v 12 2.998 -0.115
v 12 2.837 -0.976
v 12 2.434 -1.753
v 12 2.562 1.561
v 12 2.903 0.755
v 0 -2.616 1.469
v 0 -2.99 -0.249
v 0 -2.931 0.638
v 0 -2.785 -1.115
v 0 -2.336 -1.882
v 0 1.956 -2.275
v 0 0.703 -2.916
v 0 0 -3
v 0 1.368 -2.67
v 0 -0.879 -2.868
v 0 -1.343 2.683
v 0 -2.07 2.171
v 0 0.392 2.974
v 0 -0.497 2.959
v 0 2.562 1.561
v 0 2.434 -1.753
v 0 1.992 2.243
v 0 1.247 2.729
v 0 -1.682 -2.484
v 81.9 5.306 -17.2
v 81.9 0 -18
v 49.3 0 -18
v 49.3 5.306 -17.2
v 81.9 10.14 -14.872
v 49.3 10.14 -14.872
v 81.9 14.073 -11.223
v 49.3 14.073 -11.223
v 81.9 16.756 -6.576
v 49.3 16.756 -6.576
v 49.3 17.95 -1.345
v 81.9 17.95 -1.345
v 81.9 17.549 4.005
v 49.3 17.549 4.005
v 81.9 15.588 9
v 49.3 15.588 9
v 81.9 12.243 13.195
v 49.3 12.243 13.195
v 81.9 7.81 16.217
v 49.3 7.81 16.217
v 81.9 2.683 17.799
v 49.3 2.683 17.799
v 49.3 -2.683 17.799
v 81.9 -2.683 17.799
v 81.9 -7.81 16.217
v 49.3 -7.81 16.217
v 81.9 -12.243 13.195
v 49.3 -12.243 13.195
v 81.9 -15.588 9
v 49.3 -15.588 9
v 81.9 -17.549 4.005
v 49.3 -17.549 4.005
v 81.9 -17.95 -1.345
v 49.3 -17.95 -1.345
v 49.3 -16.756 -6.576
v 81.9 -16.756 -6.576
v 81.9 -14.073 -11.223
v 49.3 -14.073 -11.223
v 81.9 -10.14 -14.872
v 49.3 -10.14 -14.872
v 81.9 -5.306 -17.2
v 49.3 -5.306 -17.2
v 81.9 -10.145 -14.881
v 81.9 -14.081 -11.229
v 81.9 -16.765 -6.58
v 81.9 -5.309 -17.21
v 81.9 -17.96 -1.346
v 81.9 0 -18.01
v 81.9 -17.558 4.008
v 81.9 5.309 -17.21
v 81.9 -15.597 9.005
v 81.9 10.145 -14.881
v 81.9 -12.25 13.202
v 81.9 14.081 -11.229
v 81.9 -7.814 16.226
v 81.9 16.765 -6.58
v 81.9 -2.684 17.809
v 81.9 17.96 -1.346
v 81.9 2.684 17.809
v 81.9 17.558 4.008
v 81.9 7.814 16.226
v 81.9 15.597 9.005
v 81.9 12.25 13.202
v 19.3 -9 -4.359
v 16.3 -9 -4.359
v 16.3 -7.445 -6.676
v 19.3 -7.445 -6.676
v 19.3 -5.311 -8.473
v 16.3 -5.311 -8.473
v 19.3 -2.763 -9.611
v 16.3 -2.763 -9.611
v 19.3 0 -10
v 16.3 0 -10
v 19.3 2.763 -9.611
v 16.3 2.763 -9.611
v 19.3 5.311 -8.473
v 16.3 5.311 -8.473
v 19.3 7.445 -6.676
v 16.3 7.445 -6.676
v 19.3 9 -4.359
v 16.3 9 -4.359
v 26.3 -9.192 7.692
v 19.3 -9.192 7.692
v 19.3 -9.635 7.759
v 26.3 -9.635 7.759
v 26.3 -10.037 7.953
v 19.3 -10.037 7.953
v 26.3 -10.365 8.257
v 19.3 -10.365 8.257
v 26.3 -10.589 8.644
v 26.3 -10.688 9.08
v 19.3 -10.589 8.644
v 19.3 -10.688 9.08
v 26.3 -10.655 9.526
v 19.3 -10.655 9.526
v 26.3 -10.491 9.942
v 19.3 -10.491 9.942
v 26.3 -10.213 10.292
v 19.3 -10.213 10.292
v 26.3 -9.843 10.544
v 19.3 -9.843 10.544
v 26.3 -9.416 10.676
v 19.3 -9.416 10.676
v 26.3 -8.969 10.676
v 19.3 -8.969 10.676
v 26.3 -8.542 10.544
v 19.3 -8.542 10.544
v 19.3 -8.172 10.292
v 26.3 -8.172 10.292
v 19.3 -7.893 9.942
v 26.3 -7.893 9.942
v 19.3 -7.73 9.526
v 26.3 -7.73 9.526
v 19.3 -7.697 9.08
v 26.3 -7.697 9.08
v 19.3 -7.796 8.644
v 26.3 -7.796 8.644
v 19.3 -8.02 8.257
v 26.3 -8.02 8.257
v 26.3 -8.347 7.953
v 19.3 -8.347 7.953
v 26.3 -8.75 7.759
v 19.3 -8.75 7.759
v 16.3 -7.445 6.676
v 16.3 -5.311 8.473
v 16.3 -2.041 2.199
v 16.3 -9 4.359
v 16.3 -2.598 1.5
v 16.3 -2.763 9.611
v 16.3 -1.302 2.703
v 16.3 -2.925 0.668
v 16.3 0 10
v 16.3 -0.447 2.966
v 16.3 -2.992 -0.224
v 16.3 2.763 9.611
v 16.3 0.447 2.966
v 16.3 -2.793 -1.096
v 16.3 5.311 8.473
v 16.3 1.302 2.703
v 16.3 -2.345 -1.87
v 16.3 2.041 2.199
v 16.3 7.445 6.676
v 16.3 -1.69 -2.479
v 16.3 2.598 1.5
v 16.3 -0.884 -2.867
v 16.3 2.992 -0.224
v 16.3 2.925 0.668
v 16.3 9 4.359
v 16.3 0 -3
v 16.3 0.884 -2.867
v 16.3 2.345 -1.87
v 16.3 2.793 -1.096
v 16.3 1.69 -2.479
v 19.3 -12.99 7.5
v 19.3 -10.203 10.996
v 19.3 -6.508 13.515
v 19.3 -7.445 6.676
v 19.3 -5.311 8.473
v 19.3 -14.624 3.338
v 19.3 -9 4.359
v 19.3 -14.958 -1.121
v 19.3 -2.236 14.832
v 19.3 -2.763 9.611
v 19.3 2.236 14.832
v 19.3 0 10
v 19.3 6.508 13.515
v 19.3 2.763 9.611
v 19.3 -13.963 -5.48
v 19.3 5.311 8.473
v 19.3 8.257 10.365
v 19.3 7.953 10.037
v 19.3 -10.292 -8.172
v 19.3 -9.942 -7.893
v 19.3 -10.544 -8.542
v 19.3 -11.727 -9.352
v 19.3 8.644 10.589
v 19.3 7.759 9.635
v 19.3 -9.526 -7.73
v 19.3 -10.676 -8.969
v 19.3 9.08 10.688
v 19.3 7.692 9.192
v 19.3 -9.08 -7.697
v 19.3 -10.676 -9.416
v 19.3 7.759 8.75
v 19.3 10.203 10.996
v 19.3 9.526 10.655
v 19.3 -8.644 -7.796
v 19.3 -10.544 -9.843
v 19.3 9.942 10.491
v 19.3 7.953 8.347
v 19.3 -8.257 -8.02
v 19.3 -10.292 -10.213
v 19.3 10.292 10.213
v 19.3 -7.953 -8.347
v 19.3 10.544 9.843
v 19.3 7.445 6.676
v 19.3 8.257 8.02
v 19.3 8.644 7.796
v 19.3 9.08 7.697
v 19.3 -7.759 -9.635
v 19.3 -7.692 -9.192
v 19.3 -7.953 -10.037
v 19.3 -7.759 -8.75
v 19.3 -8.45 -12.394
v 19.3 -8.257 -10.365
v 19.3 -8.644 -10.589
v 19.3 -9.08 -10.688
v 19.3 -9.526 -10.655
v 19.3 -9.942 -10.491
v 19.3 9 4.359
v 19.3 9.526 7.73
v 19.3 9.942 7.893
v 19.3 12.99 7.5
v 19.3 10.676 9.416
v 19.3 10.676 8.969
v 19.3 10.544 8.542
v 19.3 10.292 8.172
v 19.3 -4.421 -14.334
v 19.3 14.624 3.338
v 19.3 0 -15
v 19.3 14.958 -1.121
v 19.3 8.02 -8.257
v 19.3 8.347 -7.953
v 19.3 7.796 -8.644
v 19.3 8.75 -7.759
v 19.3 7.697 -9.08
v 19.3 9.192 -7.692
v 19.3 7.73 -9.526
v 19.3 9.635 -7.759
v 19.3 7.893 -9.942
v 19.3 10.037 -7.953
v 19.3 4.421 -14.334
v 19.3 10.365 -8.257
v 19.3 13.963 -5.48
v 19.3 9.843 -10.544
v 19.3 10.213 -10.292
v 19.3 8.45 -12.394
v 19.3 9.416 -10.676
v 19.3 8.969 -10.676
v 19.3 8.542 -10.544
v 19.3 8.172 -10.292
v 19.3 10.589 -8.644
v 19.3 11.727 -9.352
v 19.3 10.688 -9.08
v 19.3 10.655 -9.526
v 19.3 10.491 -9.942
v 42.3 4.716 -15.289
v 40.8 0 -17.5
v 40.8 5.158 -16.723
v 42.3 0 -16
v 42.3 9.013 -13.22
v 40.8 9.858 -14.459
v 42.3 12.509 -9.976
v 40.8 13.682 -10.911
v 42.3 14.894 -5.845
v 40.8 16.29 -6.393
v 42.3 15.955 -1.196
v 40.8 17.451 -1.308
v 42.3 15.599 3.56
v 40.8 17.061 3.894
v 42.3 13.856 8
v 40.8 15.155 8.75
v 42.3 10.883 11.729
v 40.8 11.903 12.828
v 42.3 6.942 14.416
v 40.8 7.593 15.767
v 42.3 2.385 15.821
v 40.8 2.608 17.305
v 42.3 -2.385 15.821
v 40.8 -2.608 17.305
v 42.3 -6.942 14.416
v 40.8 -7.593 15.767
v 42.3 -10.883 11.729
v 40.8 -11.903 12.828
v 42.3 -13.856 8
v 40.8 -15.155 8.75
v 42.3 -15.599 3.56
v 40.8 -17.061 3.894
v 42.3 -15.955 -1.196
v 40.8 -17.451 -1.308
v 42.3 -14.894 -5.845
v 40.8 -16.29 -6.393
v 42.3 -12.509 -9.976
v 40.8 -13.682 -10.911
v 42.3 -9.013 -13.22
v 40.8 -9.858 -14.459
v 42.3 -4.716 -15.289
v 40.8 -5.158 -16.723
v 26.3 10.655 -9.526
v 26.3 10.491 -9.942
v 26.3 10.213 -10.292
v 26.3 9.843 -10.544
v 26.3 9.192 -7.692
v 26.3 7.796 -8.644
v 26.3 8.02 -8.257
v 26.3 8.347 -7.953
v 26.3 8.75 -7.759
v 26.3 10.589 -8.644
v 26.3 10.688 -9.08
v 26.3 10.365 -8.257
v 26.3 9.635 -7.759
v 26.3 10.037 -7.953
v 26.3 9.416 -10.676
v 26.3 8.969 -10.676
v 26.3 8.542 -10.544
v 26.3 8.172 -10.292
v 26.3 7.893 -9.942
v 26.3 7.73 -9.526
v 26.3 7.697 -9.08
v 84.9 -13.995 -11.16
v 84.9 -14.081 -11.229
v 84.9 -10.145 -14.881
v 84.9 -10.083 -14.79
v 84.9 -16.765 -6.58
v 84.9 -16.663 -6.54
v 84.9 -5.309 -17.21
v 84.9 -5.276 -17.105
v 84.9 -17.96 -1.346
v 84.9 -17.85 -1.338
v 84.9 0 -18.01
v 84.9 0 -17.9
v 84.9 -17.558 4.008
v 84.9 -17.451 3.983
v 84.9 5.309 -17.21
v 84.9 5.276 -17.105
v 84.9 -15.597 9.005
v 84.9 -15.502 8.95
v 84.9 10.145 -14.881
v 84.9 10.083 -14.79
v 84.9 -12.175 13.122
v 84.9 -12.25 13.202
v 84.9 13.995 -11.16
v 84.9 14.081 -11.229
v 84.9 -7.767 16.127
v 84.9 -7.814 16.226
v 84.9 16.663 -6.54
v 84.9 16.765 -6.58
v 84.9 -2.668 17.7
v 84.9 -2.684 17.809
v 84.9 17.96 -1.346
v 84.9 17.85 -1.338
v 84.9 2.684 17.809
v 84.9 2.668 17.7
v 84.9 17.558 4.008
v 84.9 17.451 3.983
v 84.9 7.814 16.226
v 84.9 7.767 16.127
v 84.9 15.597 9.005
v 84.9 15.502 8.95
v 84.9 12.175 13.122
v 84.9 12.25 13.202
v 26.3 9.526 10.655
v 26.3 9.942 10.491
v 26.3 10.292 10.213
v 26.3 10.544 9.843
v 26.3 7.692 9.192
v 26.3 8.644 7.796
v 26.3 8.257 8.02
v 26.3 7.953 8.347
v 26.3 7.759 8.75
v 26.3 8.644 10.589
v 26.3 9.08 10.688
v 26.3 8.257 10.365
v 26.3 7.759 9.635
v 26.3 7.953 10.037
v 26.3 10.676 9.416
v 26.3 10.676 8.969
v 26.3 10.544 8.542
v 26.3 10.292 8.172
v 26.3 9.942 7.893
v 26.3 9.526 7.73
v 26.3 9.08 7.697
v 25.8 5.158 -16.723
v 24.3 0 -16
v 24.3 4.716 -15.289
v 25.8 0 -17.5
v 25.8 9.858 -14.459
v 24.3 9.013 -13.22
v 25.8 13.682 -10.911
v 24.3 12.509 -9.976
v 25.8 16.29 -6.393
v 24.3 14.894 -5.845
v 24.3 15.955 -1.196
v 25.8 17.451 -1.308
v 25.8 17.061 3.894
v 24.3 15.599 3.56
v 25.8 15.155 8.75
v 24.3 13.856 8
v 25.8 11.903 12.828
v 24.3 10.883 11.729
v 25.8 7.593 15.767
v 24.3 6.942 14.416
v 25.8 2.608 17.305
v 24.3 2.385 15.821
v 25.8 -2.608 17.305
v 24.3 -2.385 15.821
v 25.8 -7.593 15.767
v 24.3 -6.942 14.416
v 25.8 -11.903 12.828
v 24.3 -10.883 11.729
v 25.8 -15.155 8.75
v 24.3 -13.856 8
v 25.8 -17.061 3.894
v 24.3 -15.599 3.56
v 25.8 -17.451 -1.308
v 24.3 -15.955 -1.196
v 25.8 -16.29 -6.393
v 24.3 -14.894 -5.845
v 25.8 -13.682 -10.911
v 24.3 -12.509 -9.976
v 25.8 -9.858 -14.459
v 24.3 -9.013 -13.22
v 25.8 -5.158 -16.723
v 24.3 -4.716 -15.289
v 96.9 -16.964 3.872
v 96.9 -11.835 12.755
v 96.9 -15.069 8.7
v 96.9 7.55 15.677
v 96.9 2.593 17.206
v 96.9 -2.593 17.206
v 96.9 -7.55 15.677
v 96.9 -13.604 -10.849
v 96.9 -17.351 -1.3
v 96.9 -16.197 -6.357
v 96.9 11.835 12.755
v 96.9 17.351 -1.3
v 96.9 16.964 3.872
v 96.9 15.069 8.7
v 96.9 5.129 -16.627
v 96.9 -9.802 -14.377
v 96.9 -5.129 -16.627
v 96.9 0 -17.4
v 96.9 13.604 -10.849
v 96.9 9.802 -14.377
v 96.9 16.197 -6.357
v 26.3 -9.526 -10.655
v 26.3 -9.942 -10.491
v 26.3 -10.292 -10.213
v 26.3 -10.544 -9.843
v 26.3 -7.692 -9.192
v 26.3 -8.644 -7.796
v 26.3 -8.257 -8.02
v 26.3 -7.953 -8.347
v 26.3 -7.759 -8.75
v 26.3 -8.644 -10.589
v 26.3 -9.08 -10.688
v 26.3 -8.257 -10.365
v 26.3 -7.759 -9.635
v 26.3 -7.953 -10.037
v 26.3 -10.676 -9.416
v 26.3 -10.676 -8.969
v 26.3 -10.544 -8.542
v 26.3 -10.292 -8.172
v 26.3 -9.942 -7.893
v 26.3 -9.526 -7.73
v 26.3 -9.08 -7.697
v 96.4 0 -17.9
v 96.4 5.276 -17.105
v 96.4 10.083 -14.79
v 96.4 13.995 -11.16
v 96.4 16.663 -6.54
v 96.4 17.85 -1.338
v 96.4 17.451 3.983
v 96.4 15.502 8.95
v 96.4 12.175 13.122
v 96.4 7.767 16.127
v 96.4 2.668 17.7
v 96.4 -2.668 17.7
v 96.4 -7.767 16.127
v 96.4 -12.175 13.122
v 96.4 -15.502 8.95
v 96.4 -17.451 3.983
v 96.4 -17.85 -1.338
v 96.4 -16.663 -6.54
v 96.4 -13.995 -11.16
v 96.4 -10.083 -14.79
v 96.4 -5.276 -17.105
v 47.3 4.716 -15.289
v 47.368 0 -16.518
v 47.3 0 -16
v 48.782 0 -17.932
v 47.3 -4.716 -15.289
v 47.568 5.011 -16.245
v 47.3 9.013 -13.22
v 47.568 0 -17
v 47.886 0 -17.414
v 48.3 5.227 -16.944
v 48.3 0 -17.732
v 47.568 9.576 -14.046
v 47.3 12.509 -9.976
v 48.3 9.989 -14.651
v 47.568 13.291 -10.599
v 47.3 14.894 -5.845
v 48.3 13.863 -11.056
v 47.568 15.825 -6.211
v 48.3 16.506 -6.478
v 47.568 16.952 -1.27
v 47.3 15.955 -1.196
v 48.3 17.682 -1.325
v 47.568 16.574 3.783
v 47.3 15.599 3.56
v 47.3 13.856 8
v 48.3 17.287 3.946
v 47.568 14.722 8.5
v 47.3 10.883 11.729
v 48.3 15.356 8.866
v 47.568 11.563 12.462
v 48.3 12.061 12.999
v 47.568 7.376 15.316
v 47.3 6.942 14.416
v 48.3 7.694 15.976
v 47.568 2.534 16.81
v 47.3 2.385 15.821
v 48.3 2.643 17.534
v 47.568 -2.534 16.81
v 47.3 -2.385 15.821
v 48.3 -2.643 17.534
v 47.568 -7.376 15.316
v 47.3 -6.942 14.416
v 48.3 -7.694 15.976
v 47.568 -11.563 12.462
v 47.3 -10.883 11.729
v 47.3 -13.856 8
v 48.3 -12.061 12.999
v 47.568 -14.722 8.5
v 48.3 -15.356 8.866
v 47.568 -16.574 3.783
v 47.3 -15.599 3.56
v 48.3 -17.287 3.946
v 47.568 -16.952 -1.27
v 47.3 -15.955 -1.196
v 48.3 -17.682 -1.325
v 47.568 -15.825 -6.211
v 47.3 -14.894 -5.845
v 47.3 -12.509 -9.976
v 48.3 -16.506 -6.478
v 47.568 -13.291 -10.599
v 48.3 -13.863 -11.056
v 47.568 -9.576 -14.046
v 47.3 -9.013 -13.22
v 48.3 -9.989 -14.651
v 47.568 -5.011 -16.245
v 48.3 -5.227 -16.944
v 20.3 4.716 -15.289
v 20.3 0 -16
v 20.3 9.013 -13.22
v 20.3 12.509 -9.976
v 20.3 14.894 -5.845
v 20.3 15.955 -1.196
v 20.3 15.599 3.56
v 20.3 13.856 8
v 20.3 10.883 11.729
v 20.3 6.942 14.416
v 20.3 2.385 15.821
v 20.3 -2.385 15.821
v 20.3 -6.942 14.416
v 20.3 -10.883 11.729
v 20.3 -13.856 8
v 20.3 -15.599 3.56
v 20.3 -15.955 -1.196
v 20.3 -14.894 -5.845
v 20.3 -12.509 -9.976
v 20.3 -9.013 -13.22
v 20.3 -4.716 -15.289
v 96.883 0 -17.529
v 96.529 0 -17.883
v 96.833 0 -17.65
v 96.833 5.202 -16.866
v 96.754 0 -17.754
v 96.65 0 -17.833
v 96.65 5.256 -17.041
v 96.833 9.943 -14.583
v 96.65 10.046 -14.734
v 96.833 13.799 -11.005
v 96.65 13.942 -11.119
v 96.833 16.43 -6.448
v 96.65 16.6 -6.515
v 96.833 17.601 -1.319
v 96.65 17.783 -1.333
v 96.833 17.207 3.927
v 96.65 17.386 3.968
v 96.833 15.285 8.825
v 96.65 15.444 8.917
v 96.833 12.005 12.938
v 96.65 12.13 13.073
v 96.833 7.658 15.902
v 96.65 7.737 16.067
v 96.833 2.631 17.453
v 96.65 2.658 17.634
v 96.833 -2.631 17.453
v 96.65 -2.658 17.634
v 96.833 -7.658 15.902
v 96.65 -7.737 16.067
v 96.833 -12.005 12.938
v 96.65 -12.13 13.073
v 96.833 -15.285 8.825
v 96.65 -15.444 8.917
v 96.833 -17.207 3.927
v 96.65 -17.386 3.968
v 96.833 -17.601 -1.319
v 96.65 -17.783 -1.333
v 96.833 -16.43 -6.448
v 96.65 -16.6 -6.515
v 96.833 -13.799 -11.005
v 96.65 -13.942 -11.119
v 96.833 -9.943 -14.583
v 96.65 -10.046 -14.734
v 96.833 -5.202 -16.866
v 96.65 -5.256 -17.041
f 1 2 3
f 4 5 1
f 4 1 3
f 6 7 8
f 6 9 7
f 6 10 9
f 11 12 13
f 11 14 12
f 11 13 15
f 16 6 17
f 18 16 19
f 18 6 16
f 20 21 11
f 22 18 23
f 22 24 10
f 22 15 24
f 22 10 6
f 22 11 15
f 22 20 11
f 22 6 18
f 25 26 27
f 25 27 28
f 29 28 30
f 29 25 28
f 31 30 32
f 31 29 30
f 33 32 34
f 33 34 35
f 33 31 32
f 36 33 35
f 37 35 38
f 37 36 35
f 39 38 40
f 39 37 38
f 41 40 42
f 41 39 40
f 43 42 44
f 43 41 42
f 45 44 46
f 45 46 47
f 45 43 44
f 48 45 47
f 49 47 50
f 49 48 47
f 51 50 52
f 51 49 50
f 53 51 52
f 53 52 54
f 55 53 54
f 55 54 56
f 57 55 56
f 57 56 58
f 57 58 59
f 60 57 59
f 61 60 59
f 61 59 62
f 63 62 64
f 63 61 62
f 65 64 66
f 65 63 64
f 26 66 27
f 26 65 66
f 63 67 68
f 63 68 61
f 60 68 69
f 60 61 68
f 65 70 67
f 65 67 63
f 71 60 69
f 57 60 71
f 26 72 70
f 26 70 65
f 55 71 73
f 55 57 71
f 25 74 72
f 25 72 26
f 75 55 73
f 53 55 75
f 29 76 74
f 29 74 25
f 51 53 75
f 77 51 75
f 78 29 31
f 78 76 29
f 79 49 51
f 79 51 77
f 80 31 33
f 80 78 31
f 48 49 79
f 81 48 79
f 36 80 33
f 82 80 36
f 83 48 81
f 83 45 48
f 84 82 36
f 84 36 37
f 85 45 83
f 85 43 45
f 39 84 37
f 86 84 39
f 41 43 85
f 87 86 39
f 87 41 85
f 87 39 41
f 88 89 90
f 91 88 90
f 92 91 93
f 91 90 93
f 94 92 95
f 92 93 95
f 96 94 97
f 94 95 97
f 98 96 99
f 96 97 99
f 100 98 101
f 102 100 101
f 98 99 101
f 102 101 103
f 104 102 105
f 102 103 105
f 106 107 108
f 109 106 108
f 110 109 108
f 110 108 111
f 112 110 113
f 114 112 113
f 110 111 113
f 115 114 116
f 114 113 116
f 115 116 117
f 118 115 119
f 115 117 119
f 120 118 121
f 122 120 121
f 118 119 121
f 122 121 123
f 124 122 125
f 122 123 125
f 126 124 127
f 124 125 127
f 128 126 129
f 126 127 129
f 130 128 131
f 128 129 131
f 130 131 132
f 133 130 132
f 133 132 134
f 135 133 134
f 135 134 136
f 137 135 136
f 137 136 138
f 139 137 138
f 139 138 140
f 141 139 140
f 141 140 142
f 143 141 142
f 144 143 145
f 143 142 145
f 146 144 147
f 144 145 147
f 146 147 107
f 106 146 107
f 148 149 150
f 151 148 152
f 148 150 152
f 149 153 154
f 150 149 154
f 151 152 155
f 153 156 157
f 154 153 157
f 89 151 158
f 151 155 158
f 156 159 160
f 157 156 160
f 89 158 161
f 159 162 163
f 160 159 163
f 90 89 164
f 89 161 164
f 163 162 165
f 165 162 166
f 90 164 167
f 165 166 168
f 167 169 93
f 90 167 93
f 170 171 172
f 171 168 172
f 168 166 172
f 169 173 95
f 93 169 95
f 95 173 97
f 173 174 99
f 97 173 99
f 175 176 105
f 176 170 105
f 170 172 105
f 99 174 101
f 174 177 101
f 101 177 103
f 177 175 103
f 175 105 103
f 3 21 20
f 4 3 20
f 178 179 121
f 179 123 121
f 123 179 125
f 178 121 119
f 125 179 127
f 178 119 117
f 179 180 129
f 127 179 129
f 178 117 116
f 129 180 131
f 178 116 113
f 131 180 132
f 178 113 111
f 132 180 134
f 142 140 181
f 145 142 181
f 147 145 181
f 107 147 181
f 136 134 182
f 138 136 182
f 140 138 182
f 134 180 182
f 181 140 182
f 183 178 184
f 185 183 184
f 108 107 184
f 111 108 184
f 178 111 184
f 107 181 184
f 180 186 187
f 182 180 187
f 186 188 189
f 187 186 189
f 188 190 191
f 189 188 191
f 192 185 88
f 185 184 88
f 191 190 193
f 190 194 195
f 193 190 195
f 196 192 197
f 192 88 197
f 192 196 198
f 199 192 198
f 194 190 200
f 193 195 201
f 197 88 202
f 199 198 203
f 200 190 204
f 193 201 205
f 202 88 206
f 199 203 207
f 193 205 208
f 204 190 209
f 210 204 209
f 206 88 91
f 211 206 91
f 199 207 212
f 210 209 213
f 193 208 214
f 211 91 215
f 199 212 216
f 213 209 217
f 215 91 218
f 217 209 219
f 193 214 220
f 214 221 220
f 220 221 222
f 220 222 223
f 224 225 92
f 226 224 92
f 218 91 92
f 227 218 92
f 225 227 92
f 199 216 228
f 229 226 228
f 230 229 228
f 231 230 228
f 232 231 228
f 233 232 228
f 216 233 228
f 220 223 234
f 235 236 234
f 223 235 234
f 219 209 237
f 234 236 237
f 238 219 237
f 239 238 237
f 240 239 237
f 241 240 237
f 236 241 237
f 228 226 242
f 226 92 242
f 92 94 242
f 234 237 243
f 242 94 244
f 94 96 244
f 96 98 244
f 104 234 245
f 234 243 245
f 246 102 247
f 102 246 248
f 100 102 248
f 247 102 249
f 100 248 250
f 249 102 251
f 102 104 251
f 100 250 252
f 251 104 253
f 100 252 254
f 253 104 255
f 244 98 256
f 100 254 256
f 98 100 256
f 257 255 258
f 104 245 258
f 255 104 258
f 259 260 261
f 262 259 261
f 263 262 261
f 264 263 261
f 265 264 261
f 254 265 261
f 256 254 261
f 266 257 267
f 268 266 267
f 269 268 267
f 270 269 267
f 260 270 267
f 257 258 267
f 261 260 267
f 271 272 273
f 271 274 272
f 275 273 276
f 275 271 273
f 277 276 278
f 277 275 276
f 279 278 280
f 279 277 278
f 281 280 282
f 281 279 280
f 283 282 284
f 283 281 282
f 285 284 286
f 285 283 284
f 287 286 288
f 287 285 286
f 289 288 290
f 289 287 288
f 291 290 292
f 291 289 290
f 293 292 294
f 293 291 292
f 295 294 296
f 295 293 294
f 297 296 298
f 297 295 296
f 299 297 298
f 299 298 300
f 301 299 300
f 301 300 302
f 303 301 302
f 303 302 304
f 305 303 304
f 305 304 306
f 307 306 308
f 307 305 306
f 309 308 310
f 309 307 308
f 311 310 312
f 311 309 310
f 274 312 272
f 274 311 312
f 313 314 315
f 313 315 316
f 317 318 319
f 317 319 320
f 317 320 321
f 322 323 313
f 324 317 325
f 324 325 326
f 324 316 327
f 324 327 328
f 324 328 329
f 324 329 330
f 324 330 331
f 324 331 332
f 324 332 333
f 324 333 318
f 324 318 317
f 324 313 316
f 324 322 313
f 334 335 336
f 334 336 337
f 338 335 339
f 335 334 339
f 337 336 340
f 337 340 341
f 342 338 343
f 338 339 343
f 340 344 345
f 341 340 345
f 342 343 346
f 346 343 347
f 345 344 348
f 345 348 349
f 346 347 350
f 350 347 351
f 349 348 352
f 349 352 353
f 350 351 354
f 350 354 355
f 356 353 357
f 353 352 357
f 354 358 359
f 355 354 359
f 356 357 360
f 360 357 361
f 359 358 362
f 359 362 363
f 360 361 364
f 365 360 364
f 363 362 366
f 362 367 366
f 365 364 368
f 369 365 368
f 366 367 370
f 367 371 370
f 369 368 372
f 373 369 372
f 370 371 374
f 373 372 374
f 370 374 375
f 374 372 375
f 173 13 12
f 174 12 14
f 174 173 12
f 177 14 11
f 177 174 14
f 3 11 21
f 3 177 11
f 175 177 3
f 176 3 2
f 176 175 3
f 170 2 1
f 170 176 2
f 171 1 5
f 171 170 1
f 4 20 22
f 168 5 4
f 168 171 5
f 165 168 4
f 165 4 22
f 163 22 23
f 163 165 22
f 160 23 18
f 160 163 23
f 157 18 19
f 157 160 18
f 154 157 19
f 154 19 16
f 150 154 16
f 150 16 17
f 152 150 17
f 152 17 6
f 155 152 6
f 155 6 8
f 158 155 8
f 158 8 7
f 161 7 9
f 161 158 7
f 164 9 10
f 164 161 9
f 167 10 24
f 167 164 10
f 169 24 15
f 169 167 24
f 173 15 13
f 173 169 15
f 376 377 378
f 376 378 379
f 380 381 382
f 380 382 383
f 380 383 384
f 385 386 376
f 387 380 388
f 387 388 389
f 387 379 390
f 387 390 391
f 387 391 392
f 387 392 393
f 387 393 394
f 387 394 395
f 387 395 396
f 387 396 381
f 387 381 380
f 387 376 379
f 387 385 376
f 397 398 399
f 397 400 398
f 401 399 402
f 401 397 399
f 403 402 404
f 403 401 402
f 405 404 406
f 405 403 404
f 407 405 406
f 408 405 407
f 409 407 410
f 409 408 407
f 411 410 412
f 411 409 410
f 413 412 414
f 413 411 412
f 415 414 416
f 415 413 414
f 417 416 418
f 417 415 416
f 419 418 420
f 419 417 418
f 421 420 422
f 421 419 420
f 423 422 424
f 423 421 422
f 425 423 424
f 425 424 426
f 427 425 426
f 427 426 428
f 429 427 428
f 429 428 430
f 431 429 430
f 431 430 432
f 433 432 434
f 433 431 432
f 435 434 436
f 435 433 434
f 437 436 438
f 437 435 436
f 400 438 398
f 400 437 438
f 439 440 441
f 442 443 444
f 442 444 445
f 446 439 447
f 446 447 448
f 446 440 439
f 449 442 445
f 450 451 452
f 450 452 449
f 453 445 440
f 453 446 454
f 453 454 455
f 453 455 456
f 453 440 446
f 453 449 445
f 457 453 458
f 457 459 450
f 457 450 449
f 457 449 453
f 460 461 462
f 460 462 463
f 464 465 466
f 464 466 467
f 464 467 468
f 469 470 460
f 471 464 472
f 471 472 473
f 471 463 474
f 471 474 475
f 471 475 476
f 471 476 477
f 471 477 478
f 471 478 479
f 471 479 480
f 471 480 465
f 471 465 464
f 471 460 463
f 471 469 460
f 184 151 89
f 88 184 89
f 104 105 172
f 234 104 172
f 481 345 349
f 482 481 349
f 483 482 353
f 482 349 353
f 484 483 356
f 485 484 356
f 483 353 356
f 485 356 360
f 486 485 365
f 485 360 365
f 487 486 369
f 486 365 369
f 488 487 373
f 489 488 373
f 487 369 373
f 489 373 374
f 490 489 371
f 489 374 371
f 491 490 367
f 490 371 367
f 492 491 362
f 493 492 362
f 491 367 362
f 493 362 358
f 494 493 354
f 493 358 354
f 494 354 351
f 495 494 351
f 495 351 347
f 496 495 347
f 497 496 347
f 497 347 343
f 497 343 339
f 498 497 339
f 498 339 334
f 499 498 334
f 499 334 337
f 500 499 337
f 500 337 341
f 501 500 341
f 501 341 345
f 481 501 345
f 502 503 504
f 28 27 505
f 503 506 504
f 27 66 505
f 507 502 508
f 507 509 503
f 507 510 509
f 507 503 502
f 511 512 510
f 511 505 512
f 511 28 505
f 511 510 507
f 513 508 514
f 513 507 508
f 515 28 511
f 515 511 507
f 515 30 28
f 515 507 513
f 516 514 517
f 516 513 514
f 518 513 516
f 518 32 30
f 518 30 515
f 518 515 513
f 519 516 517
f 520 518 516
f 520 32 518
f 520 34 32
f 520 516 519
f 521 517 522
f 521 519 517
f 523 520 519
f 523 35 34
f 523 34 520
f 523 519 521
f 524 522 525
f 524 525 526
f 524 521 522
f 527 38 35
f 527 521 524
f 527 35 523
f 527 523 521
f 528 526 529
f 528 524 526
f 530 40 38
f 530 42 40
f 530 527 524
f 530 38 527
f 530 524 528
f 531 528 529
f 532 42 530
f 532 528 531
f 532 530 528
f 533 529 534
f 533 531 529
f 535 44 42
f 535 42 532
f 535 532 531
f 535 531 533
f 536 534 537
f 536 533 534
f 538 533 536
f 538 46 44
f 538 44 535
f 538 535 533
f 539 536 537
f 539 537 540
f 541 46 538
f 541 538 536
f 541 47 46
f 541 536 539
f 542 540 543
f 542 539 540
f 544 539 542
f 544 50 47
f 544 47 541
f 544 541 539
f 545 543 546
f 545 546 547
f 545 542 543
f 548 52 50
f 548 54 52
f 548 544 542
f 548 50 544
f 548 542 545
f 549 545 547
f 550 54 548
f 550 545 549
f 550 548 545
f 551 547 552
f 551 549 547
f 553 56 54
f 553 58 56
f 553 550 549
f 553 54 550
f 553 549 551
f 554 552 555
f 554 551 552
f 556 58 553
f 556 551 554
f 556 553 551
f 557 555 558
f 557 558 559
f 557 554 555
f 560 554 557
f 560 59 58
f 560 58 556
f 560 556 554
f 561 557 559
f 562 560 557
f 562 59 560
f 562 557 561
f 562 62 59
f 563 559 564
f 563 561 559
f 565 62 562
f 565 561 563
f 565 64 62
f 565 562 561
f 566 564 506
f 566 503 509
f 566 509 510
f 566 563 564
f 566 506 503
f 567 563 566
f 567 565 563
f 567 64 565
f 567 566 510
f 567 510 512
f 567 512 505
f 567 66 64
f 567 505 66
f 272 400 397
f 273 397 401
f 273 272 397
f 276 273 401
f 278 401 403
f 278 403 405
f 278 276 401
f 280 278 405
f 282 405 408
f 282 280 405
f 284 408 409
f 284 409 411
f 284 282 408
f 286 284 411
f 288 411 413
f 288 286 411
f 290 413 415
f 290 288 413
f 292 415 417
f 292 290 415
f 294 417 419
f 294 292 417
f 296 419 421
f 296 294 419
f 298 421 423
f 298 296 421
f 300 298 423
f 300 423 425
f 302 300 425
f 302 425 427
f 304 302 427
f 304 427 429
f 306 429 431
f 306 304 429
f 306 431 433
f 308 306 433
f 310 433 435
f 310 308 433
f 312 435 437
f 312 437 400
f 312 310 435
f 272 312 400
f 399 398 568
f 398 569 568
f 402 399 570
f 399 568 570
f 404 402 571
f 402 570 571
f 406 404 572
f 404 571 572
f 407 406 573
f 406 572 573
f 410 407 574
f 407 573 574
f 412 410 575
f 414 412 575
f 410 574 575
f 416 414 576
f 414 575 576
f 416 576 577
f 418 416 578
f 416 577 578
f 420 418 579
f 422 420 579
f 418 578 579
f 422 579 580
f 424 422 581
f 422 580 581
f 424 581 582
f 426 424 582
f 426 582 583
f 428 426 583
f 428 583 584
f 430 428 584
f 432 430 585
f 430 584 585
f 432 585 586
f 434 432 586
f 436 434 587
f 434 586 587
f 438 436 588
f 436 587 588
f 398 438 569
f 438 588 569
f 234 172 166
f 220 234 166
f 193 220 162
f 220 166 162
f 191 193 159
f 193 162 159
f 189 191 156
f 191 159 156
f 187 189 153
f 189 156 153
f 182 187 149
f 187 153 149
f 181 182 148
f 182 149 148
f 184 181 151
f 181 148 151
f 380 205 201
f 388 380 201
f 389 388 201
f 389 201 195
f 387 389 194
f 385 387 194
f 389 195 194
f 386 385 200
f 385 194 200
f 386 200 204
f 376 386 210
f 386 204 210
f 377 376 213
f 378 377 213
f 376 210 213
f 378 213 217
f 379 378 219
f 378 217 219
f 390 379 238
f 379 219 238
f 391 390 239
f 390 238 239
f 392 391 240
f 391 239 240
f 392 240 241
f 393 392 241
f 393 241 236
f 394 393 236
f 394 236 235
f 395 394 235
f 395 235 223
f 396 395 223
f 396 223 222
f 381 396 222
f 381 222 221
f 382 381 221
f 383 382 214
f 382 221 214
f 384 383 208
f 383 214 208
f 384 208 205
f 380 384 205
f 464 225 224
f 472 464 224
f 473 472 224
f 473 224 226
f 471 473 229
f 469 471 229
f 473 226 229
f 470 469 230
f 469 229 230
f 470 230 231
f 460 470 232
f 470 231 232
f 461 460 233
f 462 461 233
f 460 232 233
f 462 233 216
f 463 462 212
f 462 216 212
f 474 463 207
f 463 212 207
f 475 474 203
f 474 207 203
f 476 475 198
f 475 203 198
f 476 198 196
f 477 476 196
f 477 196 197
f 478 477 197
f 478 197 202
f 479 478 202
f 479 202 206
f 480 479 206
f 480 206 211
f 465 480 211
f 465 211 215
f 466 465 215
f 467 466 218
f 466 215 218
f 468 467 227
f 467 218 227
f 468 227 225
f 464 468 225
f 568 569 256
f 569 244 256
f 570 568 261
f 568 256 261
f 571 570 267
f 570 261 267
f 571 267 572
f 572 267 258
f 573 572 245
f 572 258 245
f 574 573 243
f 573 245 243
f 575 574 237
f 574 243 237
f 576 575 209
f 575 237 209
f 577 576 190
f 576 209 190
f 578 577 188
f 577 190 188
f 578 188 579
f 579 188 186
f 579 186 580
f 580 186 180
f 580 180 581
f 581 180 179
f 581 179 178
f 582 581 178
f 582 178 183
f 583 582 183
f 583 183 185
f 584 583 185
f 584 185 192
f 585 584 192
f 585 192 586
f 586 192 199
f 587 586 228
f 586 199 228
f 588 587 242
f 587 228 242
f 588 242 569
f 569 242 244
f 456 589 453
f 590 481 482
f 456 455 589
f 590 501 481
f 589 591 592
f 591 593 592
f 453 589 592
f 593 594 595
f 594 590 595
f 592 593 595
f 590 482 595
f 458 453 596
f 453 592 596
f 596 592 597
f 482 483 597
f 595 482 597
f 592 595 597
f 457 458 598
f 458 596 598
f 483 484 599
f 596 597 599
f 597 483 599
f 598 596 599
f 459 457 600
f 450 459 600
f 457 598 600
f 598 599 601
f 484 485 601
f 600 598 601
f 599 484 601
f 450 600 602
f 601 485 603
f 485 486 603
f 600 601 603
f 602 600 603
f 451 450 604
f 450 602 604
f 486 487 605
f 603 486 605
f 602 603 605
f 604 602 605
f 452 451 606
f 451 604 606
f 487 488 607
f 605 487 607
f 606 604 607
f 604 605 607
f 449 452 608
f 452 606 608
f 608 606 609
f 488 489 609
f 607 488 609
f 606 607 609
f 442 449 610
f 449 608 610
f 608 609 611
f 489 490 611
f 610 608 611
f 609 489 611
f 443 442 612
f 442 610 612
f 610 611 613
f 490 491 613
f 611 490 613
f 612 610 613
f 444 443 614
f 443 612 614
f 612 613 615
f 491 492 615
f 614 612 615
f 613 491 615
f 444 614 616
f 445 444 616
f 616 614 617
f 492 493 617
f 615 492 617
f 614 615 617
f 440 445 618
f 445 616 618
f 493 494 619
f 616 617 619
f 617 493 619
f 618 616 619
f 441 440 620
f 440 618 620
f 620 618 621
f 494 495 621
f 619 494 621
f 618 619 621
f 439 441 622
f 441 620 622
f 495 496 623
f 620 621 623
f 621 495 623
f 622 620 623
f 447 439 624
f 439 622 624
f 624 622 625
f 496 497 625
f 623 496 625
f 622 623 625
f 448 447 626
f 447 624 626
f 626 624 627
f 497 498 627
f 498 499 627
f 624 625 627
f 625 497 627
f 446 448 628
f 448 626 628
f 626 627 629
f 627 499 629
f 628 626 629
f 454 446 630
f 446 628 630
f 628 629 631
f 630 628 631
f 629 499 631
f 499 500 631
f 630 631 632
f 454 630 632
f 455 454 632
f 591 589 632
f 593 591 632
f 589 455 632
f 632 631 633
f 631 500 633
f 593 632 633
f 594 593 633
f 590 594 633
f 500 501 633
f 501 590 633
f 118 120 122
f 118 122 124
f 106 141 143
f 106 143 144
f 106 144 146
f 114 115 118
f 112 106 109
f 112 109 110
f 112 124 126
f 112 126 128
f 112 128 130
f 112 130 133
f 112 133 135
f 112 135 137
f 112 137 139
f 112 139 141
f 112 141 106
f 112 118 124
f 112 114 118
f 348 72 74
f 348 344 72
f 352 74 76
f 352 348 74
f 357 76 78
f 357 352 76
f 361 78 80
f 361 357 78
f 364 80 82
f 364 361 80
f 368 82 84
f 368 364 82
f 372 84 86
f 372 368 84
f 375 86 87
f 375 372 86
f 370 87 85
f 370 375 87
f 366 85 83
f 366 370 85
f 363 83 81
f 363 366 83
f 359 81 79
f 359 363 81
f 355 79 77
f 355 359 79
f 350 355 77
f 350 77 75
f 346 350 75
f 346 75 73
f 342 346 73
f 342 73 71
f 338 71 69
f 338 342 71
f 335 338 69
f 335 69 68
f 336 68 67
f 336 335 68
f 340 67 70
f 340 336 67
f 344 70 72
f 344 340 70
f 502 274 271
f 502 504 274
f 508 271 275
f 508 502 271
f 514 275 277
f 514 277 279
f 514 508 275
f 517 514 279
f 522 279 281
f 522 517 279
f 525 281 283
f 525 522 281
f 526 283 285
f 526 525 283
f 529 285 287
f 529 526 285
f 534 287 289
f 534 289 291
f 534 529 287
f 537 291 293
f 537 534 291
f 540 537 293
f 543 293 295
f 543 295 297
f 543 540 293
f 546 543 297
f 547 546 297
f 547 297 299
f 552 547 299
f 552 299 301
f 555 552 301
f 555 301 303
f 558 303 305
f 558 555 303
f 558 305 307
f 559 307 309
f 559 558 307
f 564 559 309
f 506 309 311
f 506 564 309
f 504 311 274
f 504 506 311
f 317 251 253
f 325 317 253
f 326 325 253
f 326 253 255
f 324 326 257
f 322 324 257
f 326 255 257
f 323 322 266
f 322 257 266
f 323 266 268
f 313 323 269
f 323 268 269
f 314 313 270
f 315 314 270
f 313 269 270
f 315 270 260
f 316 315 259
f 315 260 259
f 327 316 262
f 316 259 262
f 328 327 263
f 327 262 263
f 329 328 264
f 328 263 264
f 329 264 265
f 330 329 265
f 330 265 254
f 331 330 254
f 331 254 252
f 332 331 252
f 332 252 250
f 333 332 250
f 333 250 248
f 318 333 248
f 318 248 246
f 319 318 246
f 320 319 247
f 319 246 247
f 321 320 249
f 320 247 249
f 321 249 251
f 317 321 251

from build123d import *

# Parameters (mm, degrees)
SKETCH_1_W               = 16.3
SKETCH_1_H               = 3
SKETCH_1_W_2             = 5
SKETCH_1_H_2             = 16
SKETCH_4_R               = 18
EXTRUDE_1_DEPTH          = 14
SKETCH_5_R               = 18
CUT_EXTRUDE_2_DEPTH      = 3.5
CUT_EXTRUDE_4_DEPTH      = 12
SKETCH_8_W               = 12
SKETCH_8_H               = 0.1
FILLET_3_R               = 0.5
SKETCH_10_W              = 3
SKETCH_10_H              = 0.01
CUT_EXTRUDE_6_DEPTH      = 3
SKETCH_13_R              = 1.5
CUT_EXTRUDE_8_DEPTH      = 7
PATTERN_CIRCULAR_2_COUNT = 4


with BuildPart() as part:
    # Эскиз1 → Повернуть1 (revolve)
    with BuildSketch(Plane(origin=(0, 0, 0), x_dir=(1, 0, 0), z_dir=(0, 1, 0))):
        with Locations((8.15, 1.5)):
            Rectangle(SKETCH_1_W, SKETCH_1_H)
        Polygon((16.3, 0), (19.3, 0), (19.3, 10), (16.3, 10), (16.3, 3), align=None)
        Polygon((24.3, 0), (24.3, 16), (20.3, 16), (19.3, 15), (19.3, 10), (19.3, 0), align=None)
        Polygon((40.8, 17.5), (42.3, 16), (42.3, 0), (24.3, 0), (24.3, 16), (25.8, 17.5), align=None)
        with Locations((44.8, 8)):
            Rectangle(SKETCH_1_W_2, SKETCH_1_H_2)
        with BuildLine():
            ThreePointArc((47.3, 16), (47.885786438, 17.414213562), (49.3, 18))
            Line((49.3, 18), (86.4, 18))
            Line((86.4, 18), (86.4, 0))
            Line((86.4, 0), (47.3, 0))
            Line((47.3, 0), (47.3, 16))
        make_face()
    revolve(axis=Axis((0, 0, 0), (1, 0, 0)))

    # Эскиз4 → Бобышка-Вытянуть1 (add)
    with BuildSketch(Plane(origin=(86.4, 0, 0), x_dir=(0, 0, -1), z_dir=(1, 0, 0))):
        Circle(SKETCH_4_R)
    extrude(amount=EXTRUDE_1_DEPTH)

    # Эскиз5 → Вырез-Вытянуть2 (cut)
    with BuildSketch(Plane(origin=(100.4, 0, 0), x_dir=(0, 0, -1), z_dir=(1, 0, 0))):
        Circle(SKETCH_5_R)
    extrude(amount=-CUT_EXTRUDE_2_DEPTH, mode=Mode.SUBTRACT)

    # Эскиз6 → Вырез-Вытянуть4 (cut)
    with BuildSketch(Plane.ZY):
        with BuildLine():
            Line((-1.75306936, 2.434491286), (1.561110291, 2.561822527))
            ThreePointArc((1.561110291, 2.561822527), (-0.115175441, 2.997788288), (-1.75306936, 2.434491286))
        make_face()
    extrude(amount=-CUT_EXTRUDE_4_DEPTH, mode=Mode.SUBTRACT)

    # Вырез-По траектории3: sweep along a path in Эскиз9
    with BuildLine(Plane(origin=(96.9, 0, 0), x_dir=(0, 0, -1), z_dir=(1, 0, 0))) as sweep_3_path:
        CenterArc((0, 0), 17.9, 0, 360)
    # Эскиз8 → Вырез-По траектории3 (sweep, cut)
    with BuildSketch(Plane(origin=(0, 0, 0), x_dir=(1, 0, 0), z_dir=(0, 1, 0))):
        with Locations((90.9, -17.95)):
            Rectangle(SKETCH_8_W, SKETCH_8_H)
    sweep(path=sweep_3_path.line, mode=Mode.SUBTRACT)

    # Скругление3
    fillet_3_edges = [part.edges().sort_by_distance(p)[0] for p in [
        (96.9, 0, 17.9),
    ]]
    fillet(fillet_3_edges, radius=FILLET_3_R)

    # Эскиз10 → Повернуть2 (revolve)
    with BuildSketch(Plane(origin=(0, 0, 0), x_dir=(1, 0, 0), z_dir=(0, 1, 0))):
        with Locations((83.4, 18.005)):
            Rectangle(SKETCH_10_W, SKETCH_10_H)
    revolve(axis=Axis((0, 0, 0), (1, 0, 0)))

    # Эскиз11 → Вырез-Вытянуть6 (cut)
    with BuildSketch(Plane.ZY.offset(-16.3)):
        with BuildLine():
            ThreePointArc((4.358898944, 9), (0, 10), (-4.358898944, 9))
            Line((-4.358898944, 9), (4.358898944, 9))
        make_face()
        with BuildLine():
            Line((4.358898944, -9), (-4.358898944, -9))
            ThreePointArc((-4.358898944, -9), (0, -10), (4.358898944, -9))
        make_face()
    extrude(amount=-CUT_EXTRUDE_6_DEPTH, mode=Mode.SUBTRACT)

    # Эскиз13 → Вырез-Вытянуть8 (cut)
    with BuildSketch(Plane.ZY.offset(-19.3)):
        with Locations((-9.192388155, 9.192388155)):
            Circle(SKETCH_13_R)
    cut_extrude_8 = extrude(amount=-CUT_EXTRUDE_8_DEPTH, mode=Mode.SUBTRACT)

    # Круговой массив2: Вырез-Вытянуть8 ×4 about axis
    pattern_circular_2_axis = Axis((0, 0, 0), (1, 0, 0))
    for i in range(1, PATTERN_CIRCULAR_2_COUNT):
        add(cut_extrude_8.rotate(pattern_circular_2_axis, i * 360 / PATTERN_CIRCULAR_2_COUNT), mode=Mode.SUBTRACT)


solid = part.part
